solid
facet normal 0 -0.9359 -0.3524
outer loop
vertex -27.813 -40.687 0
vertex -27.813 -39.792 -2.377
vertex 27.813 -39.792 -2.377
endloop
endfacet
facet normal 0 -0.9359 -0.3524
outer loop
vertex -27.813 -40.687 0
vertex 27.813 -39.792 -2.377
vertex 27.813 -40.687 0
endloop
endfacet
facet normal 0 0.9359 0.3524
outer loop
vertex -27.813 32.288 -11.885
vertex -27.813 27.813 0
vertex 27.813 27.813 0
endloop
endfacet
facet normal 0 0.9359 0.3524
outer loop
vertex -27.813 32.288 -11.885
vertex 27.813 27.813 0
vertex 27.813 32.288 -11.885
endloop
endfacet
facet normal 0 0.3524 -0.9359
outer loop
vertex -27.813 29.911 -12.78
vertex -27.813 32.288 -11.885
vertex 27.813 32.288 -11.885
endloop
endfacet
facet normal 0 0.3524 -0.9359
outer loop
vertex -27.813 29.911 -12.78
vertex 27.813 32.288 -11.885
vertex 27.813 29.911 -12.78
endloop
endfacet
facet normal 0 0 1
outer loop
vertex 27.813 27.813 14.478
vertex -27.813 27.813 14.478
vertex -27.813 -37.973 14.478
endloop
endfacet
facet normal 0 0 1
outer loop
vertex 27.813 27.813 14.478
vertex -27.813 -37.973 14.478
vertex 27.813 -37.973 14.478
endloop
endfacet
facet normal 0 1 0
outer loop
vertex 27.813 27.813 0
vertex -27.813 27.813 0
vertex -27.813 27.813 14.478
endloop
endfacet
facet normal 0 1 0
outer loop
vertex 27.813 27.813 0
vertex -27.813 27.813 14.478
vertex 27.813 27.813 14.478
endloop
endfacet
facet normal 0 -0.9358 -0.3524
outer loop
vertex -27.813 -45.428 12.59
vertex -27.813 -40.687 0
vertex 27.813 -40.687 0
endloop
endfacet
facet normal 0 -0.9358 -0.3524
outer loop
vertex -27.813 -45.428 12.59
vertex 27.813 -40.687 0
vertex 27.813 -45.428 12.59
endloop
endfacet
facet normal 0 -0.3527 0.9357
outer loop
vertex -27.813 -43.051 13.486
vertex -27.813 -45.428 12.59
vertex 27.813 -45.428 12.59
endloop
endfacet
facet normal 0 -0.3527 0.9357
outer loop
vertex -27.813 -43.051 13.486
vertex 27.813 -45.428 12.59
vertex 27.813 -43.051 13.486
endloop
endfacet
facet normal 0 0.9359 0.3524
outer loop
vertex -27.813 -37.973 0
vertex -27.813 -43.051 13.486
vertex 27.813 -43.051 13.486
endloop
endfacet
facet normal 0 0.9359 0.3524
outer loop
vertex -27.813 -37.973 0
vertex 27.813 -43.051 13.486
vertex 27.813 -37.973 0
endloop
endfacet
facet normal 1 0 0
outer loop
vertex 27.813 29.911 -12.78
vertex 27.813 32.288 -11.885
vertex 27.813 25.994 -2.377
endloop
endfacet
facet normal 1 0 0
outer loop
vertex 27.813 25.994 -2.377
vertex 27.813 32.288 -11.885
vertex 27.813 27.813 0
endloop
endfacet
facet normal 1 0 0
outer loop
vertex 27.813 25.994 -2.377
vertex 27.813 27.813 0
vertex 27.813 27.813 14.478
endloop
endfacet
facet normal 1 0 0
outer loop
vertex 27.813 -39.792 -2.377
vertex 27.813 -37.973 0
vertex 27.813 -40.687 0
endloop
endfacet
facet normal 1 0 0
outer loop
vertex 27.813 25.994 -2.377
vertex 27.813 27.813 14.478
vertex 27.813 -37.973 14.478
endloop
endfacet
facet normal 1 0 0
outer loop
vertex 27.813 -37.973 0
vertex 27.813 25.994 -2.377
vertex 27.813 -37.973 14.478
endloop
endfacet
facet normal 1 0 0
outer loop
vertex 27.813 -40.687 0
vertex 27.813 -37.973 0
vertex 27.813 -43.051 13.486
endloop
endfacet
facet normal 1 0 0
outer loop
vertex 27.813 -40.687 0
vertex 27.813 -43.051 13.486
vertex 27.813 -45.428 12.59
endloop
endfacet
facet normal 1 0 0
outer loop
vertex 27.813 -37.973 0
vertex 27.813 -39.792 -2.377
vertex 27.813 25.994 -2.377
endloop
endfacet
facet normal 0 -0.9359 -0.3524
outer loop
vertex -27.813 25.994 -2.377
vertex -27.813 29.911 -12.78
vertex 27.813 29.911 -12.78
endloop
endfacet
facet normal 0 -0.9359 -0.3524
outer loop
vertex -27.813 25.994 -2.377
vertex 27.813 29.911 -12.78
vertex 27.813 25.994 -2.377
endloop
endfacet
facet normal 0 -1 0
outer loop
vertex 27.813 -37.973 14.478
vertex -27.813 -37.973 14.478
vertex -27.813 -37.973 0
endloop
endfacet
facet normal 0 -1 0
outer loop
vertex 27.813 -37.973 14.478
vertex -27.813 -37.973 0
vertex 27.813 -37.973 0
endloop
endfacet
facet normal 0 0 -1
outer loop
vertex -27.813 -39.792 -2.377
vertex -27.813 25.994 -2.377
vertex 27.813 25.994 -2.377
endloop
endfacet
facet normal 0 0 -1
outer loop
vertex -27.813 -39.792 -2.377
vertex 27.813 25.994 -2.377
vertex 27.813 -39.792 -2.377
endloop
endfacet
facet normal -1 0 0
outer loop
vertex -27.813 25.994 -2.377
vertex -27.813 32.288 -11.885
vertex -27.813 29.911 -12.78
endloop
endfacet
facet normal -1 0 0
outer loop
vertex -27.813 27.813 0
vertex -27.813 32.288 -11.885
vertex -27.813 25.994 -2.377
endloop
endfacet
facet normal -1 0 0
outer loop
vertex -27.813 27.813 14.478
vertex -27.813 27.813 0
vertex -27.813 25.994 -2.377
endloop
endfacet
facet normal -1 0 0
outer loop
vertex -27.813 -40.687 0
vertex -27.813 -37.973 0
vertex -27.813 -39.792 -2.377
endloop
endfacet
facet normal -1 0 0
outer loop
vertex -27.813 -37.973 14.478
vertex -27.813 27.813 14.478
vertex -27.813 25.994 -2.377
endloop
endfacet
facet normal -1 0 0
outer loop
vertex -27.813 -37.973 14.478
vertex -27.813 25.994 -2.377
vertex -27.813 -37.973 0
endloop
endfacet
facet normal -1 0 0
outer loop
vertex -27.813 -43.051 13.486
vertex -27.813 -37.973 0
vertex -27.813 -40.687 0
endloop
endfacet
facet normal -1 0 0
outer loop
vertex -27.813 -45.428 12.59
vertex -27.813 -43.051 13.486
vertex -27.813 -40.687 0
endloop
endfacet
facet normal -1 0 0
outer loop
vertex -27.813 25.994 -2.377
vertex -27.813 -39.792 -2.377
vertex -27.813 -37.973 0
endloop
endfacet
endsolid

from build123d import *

# Parameters (mm, degrees)
F0_W     = 55.626
F0_H     = 55.626
F1_DEPTH = 14.478
F2_W     = 55.626
F2_H     = 14.478
F3_DEPTH = 10.16
F5_DEPTH = 55.626


with BuildPart() as f1:
    # F0 (on Top) → F1 (new body)
    with BuildSketch(Plane.XY):
        Rectangle(F0_W, F0_H)
    extrude(amount=F1_DEPTH)

    # F2 (on face) → F3 (join)
    with BuildSketch(Plane.XZ.offset(27.813)):
        with Locations((0, 7.239)):
            Rectangle(F2_W, F2_H)
    extrude(amount=F3_DEPTH)

    # F4 (on face) → F5 (join)
    with BuildSketch(Plane(origin=(-27.813, 0, 0), x_dir=(0, -1, 0), z_dir=(-1, 0, 0))):
        Polygon((37.973, 0), (-27.813, 0), (-32.288288, -11.885361), (-29.911216, -12.780418), (-25.993962, -2.377072), (39.792038, -2.377072), (40.687095, 0), (45.427891, 12.59049), (43.050819, 13.485548), align=None)
    extrude(amount=-F5_DEPTH)


solid = f1.part
